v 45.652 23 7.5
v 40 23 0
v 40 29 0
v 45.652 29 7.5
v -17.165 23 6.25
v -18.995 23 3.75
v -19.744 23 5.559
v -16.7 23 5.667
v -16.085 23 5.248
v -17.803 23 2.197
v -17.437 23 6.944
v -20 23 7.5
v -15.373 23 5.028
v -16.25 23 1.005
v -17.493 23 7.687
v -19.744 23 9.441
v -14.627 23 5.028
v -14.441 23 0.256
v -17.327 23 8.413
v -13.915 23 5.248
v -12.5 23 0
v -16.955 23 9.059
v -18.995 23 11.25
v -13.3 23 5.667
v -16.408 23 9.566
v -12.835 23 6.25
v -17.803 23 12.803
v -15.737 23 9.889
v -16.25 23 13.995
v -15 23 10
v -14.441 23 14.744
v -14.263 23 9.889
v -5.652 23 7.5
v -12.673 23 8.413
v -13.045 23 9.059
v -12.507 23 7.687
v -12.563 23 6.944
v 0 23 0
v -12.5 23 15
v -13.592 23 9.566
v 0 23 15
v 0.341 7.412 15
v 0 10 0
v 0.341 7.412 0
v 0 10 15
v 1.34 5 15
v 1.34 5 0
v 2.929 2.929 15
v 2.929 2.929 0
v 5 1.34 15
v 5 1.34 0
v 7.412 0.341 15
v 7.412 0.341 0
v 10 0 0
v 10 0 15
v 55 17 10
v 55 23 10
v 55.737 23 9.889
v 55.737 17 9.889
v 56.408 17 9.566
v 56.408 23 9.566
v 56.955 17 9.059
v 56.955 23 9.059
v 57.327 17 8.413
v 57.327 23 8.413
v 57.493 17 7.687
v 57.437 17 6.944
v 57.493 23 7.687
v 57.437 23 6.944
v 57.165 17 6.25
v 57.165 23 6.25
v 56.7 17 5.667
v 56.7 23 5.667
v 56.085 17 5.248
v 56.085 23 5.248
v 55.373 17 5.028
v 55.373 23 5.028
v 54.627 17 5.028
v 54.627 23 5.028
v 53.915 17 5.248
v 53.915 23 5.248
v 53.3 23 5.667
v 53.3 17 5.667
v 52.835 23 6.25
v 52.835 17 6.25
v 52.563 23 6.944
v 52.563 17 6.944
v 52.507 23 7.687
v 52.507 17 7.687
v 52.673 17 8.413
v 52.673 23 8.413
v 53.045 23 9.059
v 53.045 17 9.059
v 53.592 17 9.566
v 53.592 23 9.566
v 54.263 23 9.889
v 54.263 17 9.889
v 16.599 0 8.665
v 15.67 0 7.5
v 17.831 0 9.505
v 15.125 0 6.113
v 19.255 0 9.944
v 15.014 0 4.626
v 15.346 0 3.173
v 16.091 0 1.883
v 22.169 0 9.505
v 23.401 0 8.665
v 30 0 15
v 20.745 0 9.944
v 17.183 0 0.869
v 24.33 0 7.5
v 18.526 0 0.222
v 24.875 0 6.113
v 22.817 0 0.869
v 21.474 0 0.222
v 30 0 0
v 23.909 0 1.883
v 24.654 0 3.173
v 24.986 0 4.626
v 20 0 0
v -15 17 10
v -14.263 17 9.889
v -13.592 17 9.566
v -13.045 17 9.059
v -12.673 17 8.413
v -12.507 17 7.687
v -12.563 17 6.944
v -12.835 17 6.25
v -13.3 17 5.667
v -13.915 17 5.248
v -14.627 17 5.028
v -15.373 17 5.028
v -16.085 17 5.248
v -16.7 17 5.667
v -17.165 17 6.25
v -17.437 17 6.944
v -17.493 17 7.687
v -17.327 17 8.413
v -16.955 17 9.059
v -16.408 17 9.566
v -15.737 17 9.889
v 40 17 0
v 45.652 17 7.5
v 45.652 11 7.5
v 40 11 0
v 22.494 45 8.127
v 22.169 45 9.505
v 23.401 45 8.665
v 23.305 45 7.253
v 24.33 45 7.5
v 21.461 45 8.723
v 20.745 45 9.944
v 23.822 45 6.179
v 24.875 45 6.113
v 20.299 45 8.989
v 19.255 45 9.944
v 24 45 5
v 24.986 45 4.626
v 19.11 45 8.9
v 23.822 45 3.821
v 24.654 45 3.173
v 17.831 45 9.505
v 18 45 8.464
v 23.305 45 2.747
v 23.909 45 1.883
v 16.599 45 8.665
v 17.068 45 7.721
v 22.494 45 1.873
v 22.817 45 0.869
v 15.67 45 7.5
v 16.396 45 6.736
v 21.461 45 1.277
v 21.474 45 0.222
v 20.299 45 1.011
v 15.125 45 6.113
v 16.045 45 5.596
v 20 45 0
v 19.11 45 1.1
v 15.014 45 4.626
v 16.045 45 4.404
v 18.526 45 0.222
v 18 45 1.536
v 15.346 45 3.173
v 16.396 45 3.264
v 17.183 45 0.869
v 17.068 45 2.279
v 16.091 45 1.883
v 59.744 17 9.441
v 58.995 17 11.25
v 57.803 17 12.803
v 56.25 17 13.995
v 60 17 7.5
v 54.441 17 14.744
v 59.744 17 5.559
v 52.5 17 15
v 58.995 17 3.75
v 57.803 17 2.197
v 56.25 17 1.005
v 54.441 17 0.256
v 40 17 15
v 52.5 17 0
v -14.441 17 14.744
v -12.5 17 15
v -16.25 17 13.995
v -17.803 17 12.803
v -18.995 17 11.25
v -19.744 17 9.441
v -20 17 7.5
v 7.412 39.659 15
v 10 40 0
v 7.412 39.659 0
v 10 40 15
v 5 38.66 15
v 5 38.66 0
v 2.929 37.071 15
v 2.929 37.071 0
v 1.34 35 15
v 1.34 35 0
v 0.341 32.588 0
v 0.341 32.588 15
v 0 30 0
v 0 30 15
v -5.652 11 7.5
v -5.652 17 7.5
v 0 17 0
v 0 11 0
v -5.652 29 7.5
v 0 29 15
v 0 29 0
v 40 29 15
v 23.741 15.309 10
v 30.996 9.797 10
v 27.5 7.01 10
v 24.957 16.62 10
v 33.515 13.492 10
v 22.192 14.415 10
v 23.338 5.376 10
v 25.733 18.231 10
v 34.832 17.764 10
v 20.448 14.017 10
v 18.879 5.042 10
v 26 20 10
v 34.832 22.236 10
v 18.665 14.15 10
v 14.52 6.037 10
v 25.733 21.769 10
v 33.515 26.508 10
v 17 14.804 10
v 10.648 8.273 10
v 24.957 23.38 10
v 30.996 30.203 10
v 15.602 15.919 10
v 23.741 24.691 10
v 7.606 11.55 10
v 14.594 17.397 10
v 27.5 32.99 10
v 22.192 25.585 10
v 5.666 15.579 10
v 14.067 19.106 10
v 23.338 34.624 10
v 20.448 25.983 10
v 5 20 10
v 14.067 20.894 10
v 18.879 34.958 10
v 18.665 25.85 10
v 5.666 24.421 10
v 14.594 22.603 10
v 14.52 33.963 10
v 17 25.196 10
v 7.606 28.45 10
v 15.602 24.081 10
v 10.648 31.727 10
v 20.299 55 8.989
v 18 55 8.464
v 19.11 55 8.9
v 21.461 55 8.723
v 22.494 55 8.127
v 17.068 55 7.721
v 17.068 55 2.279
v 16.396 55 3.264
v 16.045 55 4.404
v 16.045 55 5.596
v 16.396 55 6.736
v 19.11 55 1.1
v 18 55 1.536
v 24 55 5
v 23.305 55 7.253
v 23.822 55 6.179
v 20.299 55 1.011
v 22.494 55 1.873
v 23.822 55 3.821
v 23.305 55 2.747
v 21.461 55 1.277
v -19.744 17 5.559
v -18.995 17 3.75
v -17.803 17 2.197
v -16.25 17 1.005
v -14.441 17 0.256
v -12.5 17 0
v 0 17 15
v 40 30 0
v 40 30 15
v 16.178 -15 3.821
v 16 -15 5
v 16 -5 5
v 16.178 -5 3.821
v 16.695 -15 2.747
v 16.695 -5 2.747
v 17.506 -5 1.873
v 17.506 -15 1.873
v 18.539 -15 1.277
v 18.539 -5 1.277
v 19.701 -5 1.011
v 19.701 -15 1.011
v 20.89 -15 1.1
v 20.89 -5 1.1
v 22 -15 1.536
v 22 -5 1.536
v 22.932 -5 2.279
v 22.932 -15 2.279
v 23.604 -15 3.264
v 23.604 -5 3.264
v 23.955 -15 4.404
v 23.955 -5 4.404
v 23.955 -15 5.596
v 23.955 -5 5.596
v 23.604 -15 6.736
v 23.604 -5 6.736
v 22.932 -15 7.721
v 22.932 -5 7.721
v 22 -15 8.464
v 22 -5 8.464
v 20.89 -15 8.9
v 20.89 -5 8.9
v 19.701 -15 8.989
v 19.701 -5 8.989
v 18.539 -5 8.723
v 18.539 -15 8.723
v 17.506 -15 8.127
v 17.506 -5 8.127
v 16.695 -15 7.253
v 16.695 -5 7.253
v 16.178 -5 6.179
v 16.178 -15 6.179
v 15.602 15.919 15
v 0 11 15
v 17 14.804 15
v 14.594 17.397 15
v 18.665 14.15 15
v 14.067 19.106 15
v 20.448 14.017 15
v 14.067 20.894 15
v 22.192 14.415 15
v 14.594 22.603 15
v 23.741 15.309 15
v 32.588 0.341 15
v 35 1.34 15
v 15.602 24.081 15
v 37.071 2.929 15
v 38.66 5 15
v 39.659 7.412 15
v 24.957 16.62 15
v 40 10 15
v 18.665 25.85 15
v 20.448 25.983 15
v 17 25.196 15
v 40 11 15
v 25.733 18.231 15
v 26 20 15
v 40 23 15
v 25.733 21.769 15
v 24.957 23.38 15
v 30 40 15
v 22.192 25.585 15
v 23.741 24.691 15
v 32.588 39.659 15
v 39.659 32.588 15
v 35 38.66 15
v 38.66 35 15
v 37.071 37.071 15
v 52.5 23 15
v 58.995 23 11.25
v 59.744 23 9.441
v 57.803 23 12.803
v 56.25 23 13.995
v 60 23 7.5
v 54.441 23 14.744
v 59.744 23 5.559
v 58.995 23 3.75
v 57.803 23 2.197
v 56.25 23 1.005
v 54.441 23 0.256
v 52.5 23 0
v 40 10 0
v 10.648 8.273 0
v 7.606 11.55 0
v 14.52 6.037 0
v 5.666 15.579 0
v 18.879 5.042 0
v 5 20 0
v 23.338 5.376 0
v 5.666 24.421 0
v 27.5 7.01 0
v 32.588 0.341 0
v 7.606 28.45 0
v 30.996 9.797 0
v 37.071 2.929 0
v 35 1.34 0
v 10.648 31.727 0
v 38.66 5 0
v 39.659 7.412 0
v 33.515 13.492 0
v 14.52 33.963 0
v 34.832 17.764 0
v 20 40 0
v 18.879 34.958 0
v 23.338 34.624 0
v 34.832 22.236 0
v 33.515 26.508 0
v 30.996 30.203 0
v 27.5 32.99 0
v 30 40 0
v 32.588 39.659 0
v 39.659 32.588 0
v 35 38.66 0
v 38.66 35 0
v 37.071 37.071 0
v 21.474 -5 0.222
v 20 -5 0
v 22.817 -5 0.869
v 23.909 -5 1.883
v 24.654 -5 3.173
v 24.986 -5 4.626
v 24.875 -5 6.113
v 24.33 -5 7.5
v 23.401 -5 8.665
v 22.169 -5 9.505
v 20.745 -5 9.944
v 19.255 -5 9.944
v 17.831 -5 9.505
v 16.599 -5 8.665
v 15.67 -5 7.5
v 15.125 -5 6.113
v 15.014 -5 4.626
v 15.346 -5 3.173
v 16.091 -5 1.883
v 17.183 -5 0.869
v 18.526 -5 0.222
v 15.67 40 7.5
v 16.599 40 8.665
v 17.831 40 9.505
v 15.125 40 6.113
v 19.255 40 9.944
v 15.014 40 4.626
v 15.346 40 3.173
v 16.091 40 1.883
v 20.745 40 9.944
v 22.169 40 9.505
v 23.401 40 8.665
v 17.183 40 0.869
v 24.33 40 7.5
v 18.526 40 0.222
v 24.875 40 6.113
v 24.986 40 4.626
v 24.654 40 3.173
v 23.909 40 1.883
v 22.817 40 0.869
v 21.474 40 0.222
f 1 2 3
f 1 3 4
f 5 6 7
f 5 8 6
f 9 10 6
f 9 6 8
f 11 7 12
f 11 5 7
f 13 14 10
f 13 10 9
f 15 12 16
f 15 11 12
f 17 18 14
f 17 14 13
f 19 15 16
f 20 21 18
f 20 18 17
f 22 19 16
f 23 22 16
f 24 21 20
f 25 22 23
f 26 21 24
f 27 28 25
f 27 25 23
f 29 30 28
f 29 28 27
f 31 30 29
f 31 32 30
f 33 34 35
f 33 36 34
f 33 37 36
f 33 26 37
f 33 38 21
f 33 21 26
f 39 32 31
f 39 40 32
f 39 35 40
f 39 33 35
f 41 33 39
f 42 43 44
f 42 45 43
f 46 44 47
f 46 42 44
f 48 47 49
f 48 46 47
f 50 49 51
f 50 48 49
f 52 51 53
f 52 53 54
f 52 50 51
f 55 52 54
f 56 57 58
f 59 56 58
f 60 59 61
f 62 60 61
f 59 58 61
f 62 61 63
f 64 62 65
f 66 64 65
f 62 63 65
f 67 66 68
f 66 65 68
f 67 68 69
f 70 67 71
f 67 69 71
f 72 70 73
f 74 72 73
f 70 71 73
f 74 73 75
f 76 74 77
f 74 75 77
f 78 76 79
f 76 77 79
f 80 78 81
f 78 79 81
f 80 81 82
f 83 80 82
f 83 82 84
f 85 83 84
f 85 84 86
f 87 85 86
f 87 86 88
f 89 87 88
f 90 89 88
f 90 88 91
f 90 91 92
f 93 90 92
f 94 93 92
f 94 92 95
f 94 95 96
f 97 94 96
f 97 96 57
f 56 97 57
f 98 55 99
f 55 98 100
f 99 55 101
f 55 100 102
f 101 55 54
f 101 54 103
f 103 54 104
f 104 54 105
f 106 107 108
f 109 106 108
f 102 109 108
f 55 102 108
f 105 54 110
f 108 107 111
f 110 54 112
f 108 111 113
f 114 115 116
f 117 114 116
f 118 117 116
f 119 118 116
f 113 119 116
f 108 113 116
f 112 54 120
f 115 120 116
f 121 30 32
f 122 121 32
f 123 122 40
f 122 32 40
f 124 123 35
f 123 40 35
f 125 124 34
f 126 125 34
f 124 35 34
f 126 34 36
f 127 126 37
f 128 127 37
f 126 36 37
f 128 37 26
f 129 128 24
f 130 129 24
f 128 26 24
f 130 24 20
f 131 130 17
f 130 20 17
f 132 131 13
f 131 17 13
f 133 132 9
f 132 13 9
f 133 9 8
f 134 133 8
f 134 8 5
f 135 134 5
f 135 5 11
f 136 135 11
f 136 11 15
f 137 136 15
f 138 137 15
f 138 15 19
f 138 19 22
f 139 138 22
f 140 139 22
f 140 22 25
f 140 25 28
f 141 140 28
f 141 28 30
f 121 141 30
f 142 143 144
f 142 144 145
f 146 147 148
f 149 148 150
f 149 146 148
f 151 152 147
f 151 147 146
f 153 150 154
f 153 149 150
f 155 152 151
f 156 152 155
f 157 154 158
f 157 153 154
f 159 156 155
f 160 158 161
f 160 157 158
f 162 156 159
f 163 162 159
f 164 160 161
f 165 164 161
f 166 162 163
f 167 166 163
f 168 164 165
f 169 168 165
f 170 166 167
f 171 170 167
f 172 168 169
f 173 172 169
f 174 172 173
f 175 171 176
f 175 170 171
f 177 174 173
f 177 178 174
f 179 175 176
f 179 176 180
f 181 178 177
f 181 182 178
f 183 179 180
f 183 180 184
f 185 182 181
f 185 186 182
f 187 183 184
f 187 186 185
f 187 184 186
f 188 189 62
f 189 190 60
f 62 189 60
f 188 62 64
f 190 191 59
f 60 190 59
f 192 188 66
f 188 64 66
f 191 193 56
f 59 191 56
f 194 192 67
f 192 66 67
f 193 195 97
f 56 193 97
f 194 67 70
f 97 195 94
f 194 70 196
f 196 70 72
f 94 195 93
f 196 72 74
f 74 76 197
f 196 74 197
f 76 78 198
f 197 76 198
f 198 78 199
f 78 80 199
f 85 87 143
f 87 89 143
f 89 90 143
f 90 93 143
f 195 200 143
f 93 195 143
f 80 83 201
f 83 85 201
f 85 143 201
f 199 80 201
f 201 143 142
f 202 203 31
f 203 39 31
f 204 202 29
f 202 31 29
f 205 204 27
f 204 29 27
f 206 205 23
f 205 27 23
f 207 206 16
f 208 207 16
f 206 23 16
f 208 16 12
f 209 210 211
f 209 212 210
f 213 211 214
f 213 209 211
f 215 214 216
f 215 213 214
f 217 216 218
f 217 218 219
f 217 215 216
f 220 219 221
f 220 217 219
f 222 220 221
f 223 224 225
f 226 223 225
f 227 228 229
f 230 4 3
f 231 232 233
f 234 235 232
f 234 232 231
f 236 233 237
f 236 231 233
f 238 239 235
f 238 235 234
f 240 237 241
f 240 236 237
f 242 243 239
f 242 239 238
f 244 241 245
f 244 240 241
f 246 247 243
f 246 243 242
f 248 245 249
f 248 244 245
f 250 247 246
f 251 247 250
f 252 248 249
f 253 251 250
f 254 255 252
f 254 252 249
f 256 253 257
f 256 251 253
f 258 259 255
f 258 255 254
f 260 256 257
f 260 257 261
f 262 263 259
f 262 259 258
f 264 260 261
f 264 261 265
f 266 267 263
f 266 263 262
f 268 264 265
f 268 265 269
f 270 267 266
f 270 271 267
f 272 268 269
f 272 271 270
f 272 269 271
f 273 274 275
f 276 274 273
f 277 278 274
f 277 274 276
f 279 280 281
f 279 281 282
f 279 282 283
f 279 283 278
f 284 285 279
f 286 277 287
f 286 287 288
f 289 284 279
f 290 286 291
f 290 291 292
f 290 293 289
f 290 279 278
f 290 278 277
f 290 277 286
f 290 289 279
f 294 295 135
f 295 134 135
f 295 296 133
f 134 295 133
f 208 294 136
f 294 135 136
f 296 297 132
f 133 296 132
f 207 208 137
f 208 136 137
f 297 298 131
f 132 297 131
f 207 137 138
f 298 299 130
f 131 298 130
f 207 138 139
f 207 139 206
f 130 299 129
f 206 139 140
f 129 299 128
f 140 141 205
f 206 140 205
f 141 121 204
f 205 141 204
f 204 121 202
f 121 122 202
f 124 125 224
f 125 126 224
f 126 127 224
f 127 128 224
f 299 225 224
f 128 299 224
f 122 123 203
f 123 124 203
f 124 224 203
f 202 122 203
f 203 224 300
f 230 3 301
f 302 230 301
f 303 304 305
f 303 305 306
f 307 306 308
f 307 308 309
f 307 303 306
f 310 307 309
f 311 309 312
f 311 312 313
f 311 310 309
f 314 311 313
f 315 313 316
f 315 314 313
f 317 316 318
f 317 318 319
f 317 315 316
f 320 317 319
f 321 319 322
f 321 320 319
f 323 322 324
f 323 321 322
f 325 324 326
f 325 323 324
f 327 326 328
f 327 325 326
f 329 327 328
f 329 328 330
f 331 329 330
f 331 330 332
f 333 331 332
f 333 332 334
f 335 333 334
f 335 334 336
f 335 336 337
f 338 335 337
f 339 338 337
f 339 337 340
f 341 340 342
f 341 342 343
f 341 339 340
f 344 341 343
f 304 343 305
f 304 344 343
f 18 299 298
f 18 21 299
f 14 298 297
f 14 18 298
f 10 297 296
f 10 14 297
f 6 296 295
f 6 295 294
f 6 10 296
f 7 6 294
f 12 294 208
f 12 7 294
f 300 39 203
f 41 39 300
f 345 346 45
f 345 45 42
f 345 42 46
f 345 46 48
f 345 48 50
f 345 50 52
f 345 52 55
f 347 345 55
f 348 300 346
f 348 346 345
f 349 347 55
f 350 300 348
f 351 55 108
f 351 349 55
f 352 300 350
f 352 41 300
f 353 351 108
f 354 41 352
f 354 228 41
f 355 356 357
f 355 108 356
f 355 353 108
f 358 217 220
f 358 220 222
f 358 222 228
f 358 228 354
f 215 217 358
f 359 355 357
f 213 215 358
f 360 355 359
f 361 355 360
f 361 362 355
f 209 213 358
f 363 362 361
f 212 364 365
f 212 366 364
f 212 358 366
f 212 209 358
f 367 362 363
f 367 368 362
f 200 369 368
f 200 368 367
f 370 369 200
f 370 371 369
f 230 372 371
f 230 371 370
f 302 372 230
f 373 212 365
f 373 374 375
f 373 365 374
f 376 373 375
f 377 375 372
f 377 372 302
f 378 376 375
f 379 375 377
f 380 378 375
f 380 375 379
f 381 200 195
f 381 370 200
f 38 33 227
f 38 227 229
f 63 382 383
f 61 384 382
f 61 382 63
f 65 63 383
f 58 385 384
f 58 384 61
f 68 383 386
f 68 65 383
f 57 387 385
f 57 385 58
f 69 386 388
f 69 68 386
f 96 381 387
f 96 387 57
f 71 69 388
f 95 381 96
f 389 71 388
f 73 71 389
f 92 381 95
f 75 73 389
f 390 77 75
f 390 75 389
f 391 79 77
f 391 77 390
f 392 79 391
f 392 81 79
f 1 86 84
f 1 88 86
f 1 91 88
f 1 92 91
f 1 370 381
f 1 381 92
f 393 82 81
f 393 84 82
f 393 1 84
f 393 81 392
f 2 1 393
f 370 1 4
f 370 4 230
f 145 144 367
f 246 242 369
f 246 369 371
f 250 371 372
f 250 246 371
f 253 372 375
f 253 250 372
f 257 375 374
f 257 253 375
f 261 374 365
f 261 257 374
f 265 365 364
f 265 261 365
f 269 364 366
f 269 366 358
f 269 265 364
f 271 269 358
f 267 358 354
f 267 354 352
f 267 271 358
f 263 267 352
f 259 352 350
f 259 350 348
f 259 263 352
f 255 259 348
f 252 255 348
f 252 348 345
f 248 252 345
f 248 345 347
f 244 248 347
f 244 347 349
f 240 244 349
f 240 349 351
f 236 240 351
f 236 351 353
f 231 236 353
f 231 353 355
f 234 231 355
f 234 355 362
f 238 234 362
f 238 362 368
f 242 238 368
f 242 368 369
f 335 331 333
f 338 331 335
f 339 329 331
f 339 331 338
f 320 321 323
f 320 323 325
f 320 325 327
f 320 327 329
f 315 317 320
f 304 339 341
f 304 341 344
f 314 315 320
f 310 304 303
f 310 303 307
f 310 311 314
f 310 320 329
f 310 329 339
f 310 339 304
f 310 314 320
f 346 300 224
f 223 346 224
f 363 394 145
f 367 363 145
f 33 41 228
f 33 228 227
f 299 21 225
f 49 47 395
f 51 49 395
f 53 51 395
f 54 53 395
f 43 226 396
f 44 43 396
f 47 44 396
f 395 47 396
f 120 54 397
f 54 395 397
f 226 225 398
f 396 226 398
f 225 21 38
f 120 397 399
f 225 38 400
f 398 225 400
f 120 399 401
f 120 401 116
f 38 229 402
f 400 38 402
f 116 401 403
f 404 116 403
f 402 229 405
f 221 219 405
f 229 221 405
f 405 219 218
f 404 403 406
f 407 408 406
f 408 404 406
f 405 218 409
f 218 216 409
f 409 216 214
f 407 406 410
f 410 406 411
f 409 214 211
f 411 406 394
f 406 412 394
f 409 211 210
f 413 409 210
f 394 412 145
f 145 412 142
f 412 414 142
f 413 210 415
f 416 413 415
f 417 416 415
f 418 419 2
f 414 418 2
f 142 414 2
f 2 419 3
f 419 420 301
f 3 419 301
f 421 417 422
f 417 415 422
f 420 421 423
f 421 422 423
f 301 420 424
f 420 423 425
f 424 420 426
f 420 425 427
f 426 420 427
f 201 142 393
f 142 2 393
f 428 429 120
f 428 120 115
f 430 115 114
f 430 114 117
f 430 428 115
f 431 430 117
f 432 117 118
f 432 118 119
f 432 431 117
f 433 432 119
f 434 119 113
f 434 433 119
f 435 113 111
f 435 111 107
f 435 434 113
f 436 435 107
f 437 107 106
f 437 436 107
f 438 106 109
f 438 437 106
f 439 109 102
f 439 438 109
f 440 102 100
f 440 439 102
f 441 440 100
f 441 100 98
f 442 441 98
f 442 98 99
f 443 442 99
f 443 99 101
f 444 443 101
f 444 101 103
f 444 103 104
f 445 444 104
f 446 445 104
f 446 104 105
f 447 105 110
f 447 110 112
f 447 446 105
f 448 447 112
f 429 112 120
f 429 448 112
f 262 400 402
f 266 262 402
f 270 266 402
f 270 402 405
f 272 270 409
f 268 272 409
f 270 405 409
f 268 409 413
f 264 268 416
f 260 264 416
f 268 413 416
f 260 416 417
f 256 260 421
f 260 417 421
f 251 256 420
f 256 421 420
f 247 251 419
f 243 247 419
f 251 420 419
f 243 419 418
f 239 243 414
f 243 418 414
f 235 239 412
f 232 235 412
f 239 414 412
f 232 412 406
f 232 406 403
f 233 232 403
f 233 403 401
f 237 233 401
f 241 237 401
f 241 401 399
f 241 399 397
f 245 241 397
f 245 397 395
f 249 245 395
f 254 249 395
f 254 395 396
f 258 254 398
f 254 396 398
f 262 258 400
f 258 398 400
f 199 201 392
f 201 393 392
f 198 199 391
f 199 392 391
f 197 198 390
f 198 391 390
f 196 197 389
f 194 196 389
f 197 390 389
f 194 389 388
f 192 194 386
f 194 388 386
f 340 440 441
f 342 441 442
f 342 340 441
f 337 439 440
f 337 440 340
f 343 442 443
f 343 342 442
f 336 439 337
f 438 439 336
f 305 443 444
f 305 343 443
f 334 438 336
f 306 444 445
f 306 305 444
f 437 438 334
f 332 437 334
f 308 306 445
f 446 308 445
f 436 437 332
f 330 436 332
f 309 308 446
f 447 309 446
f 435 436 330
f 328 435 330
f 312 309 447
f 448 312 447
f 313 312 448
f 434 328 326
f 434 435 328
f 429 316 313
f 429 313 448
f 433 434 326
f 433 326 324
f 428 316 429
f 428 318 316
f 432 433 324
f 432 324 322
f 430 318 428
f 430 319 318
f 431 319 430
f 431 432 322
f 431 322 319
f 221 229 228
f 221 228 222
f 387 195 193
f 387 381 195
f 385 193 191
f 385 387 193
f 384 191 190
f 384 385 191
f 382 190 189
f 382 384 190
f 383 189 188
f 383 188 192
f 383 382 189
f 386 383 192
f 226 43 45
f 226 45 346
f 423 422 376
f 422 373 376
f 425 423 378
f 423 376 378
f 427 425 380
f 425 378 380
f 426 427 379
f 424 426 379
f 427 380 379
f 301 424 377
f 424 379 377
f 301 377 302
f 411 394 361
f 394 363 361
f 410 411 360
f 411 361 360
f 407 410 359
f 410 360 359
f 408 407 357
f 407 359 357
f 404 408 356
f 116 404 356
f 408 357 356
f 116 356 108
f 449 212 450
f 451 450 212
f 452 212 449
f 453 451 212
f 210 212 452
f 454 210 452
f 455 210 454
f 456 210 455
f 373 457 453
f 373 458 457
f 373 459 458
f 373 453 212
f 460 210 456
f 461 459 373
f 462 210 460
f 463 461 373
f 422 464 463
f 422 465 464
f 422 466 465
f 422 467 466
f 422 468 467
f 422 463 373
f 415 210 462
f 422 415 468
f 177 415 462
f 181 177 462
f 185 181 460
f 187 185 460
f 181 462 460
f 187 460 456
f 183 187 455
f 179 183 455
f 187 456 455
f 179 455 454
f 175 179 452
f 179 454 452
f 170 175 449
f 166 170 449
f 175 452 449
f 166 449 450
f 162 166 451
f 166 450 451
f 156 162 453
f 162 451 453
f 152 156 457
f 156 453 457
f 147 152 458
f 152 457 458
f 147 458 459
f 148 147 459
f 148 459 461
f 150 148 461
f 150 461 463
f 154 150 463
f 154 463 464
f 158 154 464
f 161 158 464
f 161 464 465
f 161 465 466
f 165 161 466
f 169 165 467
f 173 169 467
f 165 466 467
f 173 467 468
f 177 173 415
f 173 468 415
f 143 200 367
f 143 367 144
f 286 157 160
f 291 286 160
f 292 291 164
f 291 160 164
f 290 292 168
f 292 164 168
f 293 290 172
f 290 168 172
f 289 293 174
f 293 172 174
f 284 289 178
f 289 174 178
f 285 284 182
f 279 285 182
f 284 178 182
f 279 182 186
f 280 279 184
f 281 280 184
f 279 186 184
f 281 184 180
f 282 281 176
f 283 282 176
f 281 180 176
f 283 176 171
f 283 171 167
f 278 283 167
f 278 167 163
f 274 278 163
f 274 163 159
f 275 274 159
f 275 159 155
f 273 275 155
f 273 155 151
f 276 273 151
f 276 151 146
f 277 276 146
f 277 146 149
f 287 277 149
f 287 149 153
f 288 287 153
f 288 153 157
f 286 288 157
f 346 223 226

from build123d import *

# Parameters (mm, degrees)
SKETCH1_W           = 40
SKETCH1_H           = 40
SKETCH1_R           = 6
BOSS_EXTRUDE1_DEPTH = 15
SKETCH2_R           = 15
CUT_EXTRUDE1_DEPTH  = 10
SKETCH4_R           = 4
BOSS_EXTRUDE2_DEPTH = 15
SKETCH5_R           = 5
BOSS_EXTRUDE3_DEPTH = 5
BOSS_EXTRUDE4_START = 5
SKETCH7_R           = 5
BOSS_EXTRUDE4_DEPTH = 5
BOSS_EXTRUDE5_START = 10
SKETCH8_R           = 4
BOSS_EXTRUDE5_DEPTH = 10
FILLET1_R           = 10
SKETCH9_W           = 15
SKETCH9_H           = 6
BOSS_EXTRUDE6_DEPTH = 20
SKETCH10_W          = 15
SKETCH10_H          = 6
BOSS_EXTRUDE7_DEPTH = 20
CUT_EXTRUDE2_REACH  = 74.588
SKETCH11_R          = 2.5
FILLET2_R           = 7.5
BOSS_EXTRUDE8_DEPTH = 6
BOSS_EXTRUDE9_DEPTH = 6


with BuildPart() as part:
    # Sketch1 → Boss-Extrude1 (new body)
    with BuildSketch(Plane.XY):
        with Locations((20, 20)):
            Rectangle(SKETCH1_W, SKETCH1_H)
        with Locations((20, 20)):
            Circle(SKETCH1_R, mode=Mode.SUBTRACT)
    extrude(amount=BOSS_EXTRUDE1_DEPTH)

    # Sketch2 → Cut-Extrude1 (cut)
    with BuildSketch(Plane(origin=(0, 0, 0), x_dir=(-1, 0, 0), z_dir=(0, 0, -1))):
        with Locations((-20, 20)):
            Circle(SKETCH2_R)
    extrude(amount=-CUT_EXTRUDE1_DEPTH, mode=Mode.SUBTRACT)

    # Sketch4 → Boss-Extrude2 (add)
    with BuildSketch(Plane(origin=(0, 40, 0), x_dir=(1, 0, 0), z_dir=(0, 1, 0))):
        with Locations((20, -5)):
            Circle(SKETCH4_R)
    extrude(amount=BOSS_EXTRUDE2_DEPTH)

    # Sketch5 → Boss-Extrude3 (add)
    with BuildSketch(Plane(origin=(0, 40, 0), x_dir=(1, 0, 0), z_dir=(0, 1, 0))):
        with Locations(Location((20, -5, 0), (0, 0, 90))):
            Circle(SKETCH5_R)
    extrude(amount=BOSS_EXTRUDE3_DEPTH)

    # Sketch7 → Boss-Extrude4 (add)
    with BuildSketch(Plane.XZ.offset(BOSS_EXTRUDE4_START)):
        with Locations(Location((20, 5, 0), (0, 0, 270))):
            Circle(SKETCH7_R)
    extrude(amount=-BOSS_EXTRUDE4_DEPTH)

    # Sketch8 → Boss-Extrude5 (add)
    with BuildSketch(Plane.XZ.offset(5).offset(BOSS_EXTRUDE5_START)):
        with Locations(Location((20, 5, 0), (0, 0, 180))):
            Circle(SKETCH8_R)
    extrude(amount=-BOSS_EXTRUDE5_DEPTH)

    # Fillet1
    fillet1_edges = [part.edges().sort_by_distance(p)[0] for p in [
        (40, 0, 7.5),
        (0, 0, 7.5),
        (0, 40, 7.5),
        (40, 40, 7.5),
    ]]
    fillet(fillet1_edges, radius=FILLET1_R)

    # Sketch9 → Boss-Extrude6 (add)
    with BuildSketch(Plane(origin=(40, 0, 0), x_dir=(0, 0, -1), z_dir=(1, 0, 0))):
        with Locations((-7.5, 20)):
            Rectangle(SKETCH9_W, SKETCH9_H)
    extrude(amount=BOSS_EXTRUDE6_DEPTH)

    # Sketch10 → Boss-Extrude7 (add)
    with BuildSketch(Plane.ZY):
        with Locations((7.5, 20)):
            Rectangle(SKETCH10_W, SKETCH10_H)
    extrude(amount=BOSS_EXTRUDE7_DEPTH)

    # Sketch11 → Cut-Extrude2 (cut, up to next)
    with BuildSketch(Plane(origin=(0, 23, 0), x_dir=(1, 0, 0), z_dir=(0, 1, 0)), mode=Mode.PRIVATE) as cut_extrude2_sk1:
        with Locations(Location((-15, -7.5, 0), (0, 0, 270))):
            Circle(SKETCH11_R)
    cut_extrude2_tool1 = extrude(cut_extrude2_sk1.sketch, amount=-CUT_EXTRUDE2_REACH, mode=Mode.PRIVATE) & part.part
    # Sketch11 → Cut-Extrude2 (cut, up to next)
    with BuildSketch(Plane(origin=(0, 23, 0), x_dir=(1, 0, 0), z_dir=(0, 1, 0)), mode=Mode.PRIVATE) as cut_extrude2_sk2:
        with Locations(Location((55, -7.5, 0), (0, 0, 270))):
            Circle(SKETCH11_R)
    cut_extrude2_tool2 = extrude(cut_extrude2_sk2.sketch, amount=-CUT_EXTRUDE2_REACH, mode=Mode.PRIVATE) & part.part
    add(cut_extrude2_tool1.solids().sort_by_distance((-15, 23, 7.5))[0], mode=Mode.SUBTRACT)
    add(cut_extrude2_tool2.solids().sort_by_distance((55, 23, 7.5))[0], mode=Mode.SUBTRACT)

    # Fillet2
    fillet2_edges = [part.edges().sort_by_distance(p)[0] for p in [
        (-20, 20, 15),
        (-20, 20, 0),
        (60, 20, 15),
        (60, 20, 0),
    ]]
    fillet(fillet2_edges, radius=FILLET2_R - 0.0001)  # a hair under: the kernel refuses the full size

    # Sketch12 → Boss-Extrude8 (add)
    with BuildSketch(Plane(origin=(0, 23, 0), x_dir=(1, 0, 0), z_dir=(0, 1, 0))):
        Polygon((0, 0), (0, -15), (-5.651655376, -7.5), align=None)
        Polygon((45.651655376, -7.5), (40, -15), (40, 0), align=None)
    extrude(amount=BOSS_EXTRUDE8_DEPTH)

    # Sketch13 → Boss-Extrude9 (add)
    with BuildSketch(Plane.XZ.offset(-17)):
        Polygon((0, 15), (-5.651655376, 7.5), (0, 0), align=None)
        Polygon((40, 15), (45.651655376, 7.5), (40, 0), align=None)
    extrude(amount=BOSS_EXTRUDE9_DEPTH)


solid = part.part
